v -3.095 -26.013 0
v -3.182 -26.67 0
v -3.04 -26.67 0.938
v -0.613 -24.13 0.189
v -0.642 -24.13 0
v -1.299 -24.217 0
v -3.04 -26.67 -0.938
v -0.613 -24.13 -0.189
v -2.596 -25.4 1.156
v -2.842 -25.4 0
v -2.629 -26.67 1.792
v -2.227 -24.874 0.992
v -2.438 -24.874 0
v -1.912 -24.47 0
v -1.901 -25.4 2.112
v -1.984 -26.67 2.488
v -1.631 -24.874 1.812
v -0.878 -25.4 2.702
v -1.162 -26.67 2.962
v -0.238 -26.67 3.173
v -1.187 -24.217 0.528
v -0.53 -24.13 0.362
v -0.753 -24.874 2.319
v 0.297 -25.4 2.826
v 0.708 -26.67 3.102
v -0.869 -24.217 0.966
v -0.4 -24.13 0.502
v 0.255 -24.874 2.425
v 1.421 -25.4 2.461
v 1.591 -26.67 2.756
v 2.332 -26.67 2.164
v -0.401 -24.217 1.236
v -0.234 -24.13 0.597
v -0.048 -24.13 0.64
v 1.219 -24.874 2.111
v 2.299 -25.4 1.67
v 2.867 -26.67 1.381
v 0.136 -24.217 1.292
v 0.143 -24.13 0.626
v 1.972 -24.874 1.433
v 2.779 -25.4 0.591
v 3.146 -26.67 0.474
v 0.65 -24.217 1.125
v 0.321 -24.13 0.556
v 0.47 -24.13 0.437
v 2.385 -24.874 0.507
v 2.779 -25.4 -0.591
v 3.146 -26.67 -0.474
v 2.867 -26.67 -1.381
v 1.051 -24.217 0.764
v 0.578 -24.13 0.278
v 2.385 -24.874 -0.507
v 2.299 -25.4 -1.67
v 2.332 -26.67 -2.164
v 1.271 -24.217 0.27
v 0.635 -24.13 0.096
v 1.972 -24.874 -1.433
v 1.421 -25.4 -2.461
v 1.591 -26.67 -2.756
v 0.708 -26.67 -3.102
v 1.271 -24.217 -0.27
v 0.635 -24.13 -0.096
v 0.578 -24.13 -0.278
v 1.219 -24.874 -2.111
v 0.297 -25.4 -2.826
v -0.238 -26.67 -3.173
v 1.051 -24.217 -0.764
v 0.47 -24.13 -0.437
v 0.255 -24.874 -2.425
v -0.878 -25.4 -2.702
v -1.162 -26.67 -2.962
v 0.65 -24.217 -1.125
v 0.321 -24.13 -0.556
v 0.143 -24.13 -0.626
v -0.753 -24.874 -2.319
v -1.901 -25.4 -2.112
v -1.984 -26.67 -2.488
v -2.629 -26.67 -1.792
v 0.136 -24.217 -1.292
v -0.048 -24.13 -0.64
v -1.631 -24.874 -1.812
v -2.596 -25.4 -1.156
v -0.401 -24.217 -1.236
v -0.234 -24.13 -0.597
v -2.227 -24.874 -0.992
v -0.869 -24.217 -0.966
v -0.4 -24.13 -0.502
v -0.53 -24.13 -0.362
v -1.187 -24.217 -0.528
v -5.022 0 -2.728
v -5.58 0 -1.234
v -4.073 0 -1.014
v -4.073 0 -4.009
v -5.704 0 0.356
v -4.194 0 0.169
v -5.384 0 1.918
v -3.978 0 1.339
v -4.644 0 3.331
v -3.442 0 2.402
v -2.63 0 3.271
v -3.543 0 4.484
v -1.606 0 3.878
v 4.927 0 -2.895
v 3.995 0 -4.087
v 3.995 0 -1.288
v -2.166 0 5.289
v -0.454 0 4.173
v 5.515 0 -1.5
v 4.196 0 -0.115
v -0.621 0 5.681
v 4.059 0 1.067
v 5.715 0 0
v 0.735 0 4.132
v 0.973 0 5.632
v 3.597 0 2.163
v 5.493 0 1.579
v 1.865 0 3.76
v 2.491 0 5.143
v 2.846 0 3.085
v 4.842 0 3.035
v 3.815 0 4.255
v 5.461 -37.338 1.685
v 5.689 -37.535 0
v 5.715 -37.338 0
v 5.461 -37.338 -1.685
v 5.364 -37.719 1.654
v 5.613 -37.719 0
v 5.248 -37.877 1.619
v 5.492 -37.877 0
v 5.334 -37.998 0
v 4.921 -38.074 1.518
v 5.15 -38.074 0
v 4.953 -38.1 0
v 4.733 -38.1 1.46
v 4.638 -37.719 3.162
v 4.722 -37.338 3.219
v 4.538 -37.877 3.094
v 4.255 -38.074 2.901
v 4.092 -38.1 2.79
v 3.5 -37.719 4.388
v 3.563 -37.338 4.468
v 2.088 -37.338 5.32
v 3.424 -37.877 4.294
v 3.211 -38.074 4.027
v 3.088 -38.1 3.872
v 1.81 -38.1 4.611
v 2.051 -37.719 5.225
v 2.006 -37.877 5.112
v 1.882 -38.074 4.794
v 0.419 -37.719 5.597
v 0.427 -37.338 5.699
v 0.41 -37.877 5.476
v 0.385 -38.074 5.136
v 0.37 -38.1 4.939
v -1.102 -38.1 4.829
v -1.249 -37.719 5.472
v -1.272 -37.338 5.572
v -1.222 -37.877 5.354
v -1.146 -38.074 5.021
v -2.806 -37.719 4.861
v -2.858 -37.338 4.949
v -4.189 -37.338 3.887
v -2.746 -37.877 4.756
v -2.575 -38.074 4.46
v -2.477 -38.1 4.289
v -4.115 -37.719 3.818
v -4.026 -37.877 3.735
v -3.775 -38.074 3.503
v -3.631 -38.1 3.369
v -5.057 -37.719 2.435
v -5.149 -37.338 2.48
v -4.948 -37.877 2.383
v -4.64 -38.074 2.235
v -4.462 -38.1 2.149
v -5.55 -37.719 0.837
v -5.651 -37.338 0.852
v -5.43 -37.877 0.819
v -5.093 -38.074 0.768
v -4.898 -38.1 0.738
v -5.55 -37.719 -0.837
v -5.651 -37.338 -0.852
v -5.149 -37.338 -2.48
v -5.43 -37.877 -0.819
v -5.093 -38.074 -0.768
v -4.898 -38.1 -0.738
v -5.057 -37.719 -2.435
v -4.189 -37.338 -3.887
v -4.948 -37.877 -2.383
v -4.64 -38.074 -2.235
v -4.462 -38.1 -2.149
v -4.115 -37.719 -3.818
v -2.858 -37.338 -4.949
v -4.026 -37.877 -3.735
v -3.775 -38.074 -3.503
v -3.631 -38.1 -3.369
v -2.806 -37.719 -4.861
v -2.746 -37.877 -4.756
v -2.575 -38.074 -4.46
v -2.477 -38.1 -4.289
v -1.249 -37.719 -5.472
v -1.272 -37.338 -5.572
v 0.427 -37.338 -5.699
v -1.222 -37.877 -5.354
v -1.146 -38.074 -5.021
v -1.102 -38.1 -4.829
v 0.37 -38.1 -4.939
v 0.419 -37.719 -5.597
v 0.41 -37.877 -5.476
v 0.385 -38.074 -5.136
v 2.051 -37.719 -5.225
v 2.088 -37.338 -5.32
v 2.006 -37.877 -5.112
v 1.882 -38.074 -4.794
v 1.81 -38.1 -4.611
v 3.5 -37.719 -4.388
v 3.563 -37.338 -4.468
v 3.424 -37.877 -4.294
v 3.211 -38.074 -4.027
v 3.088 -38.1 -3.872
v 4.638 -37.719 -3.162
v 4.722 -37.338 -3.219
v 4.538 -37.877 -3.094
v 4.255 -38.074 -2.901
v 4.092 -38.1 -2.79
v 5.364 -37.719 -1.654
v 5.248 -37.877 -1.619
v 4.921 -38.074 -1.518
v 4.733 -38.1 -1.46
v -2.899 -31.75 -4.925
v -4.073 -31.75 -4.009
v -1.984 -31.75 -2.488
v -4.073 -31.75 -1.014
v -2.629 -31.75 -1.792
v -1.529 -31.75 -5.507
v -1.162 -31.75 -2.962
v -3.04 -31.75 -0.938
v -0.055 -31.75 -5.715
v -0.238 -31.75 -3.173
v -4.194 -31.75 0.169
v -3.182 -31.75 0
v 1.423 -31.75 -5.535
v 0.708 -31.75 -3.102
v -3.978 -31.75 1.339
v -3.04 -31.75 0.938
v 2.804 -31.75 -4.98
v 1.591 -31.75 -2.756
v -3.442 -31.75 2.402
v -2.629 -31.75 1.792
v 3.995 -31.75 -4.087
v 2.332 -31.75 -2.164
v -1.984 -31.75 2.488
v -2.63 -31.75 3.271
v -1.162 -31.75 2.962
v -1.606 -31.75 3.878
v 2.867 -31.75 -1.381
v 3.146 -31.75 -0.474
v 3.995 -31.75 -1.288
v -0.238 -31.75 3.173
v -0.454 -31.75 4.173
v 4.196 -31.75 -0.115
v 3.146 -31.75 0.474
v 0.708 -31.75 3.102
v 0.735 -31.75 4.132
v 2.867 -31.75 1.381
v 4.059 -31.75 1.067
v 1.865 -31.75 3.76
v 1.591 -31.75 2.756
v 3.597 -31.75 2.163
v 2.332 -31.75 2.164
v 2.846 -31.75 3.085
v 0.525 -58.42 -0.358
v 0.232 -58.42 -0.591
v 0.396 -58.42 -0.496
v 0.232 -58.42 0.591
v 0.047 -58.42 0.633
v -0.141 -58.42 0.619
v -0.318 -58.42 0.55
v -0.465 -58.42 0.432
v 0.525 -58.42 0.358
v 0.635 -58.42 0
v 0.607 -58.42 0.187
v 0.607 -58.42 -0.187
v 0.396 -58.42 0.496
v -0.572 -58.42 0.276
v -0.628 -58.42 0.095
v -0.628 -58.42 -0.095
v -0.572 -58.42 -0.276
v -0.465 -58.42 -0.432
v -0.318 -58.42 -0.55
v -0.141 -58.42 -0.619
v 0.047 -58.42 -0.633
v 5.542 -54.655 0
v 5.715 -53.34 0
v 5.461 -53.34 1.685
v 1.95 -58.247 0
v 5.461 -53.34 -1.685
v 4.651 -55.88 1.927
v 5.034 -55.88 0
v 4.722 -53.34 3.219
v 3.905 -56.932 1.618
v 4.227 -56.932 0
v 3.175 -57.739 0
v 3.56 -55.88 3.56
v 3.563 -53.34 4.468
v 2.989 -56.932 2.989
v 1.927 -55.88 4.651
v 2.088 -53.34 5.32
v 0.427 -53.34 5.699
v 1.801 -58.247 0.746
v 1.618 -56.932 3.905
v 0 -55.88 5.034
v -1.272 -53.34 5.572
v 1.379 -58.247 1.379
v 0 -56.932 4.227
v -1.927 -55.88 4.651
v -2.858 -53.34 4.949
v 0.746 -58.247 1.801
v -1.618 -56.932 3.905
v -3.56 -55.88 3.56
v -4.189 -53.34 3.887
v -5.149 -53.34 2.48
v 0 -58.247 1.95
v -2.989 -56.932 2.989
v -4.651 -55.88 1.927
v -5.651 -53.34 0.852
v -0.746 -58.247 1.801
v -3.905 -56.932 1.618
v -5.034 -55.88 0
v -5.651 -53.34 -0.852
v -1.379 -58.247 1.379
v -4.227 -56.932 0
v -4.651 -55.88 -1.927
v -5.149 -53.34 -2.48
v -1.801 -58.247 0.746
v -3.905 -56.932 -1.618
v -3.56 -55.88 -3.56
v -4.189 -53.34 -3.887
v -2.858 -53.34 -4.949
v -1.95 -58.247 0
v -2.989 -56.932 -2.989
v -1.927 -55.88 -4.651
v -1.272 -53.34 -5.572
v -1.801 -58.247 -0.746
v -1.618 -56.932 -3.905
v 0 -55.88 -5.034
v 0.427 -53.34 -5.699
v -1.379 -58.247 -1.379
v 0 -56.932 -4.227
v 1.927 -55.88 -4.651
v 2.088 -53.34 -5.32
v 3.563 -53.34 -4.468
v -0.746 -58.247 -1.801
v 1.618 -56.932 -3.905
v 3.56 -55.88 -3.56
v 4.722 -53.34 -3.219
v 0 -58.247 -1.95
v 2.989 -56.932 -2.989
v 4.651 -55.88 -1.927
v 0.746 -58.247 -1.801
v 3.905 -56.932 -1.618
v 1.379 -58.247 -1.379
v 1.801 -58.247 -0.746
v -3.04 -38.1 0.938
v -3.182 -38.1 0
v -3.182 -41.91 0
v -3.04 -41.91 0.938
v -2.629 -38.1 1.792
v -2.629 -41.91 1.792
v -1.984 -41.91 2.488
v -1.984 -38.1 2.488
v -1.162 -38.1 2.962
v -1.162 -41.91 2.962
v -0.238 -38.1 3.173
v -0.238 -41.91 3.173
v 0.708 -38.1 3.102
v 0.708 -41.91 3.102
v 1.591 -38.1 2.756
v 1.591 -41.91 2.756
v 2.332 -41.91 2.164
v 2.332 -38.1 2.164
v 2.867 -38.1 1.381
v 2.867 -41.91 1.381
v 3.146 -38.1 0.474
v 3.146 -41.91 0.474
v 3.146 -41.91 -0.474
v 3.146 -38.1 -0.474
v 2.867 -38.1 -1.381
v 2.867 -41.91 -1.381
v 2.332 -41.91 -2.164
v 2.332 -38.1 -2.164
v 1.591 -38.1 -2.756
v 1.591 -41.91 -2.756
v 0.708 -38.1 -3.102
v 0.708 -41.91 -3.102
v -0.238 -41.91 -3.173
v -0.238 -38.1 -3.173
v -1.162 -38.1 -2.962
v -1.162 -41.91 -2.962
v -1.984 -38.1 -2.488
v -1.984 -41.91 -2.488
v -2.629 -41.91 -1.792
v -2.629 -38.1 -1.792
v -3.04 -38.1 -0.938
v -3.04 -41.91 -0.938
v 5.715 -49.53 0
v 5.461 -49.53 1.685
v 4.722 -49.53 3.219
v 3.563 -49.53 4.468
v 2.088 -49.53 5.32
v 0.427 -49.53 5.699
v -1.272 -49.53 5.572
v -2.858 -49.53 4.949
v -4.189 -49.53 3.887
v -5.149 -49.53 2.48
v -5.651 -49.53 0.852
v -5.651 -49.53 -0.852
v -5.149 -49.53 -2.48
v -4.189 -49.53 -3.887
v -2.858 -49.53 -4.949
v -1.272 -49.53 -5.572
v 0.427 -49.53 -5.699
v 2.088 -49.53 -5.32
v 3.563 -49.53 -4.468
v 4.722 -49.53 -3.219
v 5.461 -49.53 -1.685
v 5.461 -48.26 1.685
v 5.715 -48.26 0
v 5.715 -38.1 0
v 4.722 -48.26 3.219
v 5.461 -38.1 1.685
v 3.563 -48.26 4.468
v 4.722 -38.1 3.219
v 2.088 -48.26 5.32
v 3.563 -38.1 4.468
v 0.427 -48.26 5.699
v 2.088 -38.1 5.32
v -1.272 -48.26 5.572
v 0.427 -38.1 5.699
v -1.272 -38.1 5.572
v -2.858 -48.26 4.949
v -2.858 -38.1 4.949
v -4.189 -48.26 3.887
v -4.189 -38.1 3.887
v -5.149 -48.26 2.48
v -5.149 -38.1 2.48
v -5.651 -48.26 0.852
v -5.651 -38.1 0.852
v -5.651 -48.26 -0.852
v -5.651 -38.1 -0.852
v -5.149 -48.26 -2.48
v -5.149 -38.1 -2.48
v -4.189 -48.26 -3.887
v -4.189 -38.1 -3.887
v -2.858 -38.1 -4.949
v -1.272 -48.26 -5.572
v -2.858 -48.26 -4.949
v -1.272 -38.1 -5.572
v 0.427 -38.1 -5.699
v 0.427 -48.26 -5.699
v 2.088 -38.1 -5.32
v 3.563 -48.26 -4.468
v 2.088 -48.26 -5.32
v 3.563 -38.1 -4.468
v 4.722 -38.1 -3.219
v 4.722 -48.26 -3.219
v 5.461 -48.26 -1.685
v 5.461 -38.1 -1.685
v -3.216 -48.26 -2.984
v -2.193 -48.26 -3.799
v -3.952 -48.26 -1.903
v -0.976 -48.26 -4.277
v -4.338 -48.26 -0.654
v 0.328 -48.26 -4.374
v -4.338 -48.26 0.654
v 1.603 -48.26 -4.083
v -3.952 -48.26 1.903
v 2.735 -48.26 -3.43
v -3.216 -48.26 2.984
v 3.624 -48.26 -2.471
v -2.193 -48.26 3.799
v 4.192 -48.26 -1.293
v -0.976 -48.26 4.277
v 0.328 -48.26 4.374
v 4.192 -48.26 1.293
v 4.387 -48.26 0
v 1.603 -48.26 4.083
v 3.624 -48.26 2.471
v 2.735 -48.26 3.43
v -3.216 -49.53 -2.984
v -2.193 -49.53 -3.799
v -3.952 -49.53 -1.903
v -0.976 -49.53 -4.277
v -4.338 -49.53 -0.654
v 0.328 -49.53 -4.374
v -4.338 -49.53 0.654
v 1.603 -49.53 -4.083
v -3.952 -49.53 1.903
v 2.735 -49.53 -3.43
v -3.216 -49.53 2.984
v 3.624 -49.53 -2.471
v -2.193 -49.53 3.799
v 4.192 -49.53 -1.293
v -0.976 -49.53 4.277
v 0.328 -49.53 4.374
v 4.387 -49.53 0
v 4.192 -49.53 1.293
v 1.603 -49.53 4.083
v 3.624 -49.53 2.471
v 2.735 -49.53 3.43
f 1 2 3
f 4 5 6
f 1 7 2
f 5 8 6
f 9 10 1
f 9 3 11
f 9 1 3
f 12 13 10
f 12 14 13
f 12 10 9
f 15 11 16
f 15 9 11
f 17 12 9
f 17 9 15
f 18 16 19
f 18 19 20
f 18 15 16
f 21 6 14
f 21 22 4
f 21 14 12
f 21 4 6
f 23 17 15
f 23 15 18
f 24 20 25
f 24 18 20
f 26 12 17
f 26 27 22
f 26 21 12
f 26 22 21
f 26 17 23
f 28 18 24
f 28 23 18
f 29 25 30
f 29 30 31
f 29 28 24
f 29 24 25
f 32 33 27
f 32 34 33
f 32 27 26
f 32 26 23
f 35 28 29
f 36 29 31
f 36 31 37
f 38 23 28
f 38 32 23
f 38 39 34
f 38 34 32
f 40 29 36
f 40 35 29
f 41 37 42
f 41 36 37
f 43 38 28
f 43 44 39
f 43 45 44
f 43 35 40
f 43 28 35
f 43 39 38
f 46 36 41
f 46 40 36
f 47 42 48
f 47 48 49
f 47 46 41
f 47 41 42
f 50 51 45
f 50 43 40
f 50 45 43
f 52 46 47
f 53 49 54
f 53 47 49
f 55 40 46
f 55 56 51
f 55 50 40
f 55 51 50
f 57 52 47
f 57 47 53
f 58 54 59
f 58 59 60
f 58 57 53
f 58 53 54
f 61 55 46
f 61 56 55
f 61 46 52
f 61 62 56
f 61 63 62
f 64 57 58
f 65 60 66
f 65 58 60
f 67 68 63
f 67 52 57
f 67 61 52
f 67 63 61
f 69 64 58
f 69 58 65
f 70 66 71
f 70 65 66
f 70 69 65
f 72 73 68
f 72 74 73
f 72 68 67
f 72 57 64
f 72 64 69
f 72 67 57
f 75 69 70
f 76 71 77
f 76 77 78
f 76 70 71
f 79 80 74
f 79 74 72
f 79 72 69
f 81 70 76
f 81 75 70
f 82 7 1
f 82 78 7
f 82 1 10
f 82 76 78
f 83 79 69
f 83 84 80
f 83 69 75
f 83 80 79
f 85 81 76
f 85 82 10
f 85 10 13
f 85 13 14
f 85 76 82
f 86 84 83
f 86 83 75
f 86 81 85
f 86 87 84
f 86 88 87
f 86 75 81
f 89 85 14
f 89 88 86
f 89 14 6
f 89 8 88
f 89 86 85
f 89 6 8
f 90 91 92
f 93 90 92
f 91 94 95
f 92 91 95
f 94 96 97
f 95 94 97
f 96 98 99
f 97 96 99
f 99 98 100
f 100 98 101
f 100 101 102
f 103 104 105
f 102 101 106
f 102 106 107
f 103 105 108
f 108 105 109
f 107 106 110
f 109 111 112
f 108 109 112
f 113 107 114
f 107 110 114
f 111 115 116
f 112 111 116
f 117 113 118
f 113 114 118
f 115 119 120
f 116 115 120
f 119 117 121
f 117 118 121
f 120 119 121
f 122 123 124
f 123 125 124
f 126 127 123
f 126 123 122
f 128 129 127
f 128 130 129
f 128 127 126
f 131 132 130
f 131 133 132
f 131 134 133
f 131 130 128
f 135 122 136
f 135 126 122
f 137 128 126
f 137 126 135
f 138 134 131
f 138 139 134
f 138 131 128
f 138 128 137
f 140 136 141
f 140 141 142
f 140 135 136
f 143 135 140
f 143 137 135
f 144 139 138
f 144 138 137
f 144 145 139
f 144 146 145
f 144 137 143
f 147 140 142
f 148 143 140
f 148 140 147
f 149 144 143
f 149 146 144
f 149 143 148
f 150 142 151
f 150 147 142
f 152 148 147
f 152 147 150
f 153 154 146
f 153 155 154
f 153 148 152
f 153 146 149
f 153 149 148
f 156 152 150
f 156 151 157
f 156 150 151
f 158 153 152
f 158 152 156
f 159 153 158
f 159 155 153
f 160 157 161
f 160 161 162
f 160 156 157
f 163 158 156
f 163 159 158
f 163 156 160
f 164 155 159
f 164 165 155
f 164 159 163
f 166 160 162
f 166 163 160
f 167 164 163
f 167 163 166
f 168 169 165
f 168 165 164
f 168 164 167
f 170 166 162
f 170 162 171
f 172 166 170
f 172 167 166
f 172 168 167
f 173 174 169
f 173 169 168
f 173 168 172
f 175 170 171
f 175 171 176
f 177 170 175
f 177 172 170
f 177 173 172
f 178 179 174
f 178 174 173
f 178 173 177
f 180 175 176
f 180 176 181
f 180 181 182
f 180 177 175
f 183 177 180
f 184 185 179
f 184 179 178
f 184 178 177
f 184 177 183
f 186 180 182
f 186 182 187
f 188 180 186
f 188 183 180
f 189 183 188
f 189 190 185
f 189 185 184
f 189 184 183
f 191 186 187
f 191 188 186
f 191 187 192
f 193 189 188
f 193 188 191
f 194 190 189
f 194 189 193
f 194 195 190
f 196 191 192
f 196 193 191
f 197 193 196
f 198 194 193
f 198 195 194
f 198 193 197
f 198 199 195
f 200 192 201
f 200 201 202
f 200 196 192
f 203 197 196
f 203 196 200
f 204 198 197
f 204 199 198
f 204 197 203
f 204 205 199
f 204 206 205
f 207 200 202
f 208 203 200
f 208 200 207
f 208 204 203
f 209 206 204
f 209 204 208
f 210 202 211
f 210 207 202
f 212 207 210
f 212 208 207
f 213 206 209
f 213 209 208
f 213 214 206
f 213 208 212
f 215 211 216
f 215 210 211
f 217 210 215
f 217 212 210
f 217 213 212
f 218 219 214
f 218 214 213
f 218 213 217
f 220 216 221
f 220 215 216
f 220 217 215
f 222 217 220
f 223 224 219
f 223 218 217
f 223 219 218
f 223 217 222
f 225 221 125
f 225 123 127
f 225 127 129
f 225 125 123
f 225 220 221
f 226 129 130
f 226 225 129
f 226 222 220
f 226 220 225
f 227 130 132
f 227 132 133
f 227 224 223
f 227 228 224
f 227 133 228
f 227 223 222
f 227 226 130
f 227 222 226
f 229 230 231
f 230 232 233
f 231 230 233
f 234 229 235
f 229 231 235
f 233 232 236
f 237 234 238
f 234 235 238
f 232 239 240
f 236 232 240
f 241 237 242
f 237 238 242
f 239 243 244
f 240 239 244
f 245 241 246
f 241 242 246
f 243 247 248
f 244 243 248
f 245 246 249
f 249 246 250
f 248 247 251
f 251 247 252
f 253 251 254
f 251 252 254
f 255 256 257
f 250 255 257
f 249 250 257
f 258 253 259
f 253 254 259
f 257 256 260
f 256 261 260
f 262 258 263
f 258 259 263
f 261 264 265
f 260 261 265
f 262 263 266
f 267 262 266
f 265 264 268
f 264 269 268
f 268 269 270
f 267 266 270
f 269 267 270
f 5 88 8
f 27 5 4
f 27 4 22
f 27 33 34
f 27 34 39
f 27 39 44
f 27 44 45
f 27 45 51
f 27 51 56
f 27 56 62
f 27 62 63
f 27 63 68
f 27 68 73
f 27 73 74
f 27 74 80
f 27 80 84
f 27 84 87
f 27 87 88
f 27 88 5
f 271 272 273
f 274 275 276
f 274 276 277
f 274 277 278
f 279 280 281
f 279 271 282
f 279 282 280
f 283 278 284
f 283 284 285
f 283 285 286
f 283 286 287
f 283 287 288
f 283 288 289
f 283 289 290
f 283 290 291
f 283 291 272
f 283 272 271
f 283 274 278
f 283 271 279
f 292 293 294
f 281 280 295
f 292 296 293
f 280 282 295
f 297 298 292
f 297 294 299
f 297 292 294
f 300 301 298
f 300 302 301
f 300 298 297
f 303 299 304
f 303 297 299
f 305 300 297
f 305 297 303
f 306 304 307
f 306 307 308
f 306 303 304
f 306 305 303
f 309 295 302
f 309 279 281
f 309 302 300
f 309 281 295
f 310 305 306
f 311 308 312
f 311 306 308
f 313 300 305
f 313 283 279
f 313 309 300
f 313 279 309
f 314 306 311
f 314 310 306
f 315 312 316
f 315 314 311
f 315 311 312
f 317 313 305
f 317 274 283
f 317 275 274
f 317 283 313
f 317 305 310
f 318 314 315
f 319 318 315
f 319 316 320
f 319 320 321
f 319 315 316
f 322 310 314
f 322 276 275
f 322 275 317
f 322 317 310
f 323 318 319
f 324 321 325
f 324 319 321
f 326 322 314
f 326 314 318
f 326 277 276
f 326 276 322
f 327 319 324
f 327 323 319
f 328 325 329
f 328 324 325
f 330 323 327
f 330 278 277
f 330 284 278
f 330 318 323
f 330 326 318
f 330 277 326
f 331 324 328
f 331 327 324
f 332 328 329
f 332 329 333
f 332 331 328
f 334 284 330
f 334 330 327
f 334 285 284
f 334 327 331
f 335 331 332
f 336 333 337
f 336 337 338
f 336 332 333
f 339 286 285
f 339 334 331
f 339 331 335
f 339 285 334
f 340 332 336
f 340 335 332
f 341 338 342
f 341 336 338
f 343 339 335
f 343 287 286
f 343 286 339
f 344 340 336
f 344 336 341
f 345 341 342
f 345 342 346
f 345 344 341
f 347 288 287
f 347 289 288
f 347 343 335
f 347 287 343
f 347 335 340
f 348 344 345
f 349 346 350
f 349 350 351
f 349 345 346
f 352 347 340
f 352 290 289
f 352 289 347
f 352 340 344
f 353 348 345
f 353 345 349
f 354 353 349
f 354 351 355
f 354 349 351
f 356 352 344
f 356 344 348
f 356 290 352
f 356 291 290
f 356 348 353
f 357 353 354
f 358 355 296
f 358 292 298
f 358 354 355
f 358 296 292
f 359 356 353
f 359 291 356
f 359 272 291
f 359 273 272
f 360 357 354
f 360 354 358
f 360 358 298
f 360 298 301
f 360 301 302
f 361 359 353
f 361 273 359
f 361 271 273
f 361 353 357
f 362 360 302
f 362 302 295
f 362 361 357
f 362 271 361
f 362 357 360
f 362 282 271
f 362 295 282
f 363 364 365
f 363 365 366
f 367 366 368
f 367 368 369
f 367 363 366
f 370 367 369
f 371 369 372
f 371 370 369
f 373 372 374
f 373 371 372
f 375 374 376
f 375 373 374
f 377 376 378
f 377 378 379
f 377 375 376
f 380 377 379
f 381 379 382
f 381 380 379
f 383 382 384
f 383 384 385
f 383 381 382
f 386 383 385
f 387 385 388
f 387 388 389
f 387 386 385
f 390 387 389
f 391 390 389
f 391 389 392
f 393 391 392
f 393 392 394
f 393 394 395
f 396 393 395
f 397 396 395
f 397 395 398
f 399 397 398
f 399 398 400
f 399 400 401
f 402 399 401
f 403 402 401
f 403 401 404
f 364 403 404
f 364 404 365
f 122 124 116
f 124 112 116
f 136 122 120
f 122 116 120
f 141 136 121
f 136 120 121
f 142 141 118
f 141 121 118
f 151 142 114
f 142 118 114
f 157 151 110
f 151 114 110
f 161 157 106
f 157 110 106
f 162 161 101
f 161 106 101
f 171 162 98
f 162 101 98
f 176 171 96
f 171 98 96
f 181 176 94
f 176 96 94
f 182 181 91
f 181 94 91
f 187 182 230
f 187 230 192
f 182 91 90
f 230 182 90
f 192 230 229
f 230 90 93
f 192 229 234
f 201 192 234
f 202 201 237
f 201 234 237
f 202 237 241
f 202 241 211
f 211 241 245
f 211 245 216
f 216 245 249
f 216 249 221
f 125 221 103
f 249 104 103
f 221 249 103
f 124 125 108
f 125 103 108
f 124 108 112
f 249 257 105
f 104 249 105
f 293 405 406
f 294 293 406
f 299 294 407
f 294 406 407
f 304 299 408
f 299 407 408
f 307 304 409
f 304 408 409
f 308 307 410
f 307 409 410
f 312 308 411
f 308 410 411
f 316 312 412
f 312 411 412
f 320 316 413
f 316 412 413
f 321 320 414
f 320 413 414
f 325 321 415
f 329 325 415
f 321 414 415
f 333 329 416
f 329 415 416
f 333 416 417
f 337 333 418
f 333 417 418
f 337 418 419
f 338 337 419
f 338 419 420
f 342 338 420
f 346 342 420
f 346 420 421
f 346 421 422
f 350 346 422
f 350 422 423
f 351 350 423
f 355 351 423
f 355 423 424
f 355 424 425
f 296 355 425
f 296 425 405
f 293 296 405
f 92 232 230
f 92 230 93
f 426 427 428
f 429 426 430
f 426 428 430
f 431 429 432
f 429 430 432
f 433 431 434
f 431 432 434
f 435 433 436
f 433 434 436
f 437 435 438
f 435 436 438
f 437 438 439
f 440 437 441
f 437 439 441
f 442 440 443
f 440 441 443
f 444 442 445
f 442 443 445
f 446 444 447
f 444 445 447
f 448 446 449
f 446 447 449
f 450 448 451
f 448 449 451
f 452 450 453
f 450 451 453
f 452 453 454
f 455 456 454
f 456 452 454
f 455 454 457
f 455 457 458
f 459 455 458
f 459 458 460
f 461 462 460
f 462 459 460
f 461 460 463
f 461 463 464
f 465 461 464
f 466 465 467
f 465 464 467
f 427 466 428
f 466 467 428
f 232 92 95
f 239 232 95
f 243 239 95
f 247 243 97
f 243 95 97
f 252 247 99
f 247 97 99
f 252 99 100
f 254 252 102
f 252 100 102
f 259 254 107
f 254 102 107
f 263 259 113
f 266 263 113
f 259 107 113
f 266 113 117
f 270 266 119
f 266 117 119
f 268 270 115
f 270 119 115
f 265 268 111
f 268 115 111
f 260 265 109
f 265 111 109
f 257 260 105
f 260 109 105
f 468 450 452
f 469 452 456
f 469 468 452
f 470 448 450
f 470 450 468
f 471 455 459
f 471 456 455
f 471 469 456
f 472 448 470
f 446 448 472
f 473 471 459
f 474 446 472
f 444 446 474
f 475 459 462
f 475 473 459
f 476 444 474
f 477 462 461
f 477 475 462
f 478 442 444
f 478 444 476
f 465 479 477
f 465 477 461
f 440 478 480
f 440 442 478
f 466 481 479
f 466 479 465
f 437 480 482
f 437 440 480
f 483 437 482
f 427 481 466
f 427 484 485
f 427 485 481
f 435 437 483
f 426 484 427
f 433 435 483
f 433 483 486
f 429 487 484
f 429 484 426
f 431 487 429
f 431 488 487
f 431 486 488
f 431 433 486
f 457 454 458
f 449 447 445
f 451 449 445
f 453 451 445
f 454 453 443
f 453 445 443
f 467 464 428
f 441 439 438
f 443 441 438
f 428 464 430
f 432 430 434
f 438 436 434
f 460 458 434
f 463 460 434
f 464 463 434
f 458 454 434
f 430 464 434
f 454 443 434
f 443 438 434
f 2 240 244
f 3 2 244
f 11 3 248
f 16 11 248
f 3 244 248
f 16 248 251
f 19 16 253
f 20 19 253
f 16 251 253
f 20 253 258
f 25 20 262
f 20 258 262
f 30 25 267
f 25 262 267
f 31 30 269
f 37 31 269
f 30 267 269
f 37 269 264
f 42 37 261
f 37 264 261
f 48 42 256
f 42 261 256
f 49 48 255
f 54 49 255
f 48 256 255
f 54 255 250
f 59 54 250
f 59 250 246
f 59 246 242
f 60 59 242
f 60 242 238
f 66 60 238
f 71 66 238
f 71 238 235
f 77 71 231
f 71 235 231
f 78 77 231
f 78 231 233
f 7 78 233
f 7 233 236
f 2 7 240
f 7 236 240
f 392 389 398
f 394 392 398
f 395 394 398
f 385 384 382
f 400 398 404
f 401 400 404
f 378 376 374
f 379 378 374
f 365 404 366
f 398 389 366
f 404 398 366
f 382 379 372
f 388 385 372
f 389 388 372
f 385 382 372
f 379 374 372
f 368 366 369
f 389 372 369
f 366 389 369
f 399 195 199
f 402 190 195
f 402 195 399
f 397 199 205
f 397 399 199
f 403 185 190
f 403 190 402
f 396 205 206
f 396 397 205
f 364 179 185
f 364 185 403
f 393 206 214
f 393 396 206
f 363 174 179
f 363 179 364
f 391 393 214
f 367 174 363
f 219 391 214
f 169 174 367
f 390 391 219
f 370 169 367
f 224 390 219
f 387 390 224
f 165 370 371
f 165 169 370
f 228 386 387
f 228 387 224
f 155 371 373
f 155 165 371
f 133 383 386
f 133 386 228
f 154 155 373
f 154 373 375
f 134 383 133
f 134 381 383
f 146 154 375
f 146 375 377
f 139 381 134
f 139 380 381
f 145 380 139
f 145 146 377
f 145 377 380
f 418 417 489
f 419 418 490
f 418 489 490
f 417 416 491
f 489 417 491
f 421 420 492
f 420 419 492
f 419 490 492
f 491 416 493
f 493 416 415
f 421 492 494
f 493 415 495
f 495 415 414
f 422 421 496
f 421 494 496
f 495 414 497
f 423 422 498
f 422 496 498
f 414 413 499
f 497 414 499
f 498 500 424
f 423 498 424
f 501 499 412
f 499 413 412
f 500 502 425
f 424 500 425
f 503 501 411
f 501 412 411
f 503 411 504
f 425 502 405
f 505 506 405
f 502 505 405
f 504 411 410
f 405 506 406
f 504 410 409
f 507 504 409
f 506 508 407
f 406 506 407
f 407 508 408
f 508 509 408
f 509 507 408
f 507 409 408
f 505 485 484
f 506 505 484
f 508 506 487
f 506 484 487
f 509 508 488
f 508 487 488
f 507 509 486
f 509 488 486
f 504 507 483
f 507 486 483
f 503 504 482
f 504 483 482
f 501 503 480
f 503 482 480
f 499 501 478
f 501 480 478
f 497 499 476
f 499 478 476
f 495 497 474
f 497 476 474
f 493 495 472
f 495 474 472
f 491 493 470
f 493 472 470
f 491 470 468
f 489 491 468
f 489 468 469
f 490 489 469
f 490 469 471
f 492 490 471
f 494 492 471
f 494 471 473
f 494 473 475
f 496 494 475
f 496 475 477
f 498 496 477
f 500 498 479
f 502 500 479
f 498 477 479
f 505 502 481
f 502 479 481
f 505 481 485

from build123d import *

# Parameters (mm, degrees)
F0_R           = 5.715
F1_DEPTH       = 38.1
F2_R           = 5.715
F3_DEPTH       = 20.32
F4_R           = 0.762
F5_R           = 4.1972298984
F6_DEPTH       = 31.75
F7_W           = 8.0674731684
F7_H           = 31.75
F8_DEPTH       = 25.4
F9_R           = 3.1818163762
F10_DEPTH      = 7.62
F10_DEPTH_BACK = 10.16
F11_R          = 2.54
F12_R          = 5.08
F14_R          = 10.1897381857
F14_R_2        = 4.3866323881
F15_DEPTH      = 1.27


with BuildPart() as f1:
    # F0 (on Front) → F1 (new body)
    with BuildSketch(Plane.XZ):
        Circle(F0_R)
    extrude(amount=F1_DEPTH)

    # F4
    f4_edges = [f1.edges().sort_by_distance(p)[0] for p in [
        (-5.715, -38.1, 0),
    ]]
    fillet(f4_edges, radius=F4_R)

    # F5 (on face) → F6 (cut)
    with BuildSketch(Plane(origin=(0, 0, 0), x_dir=(-1, 0, 0), z_dir=(0, 1, 0))):
        Circle(F5_R)
    extrude(amount=-F6_DEPTH, mode=Mode.SUBTRACT)

    # F7 (on Top) → F8 (cut)
    with BuildSketch(Plane.XY):
        with Locations((-0.0390663249, -15.875)):
            Rectangle(F7_W, F7_H)
    extrude(amount=-F8_DEPTH, mode=Mode.SUBTRACT)

    # F9 (on face) → F10 (join, two sides)
    with BuildSketch(Plane(origin=(0, -31.75, 0), x_dir=(-1, 0, 0), z_dir=(0, 1, 0))) as f10_sk:
        Circle(F9_R)
    extrude(amount=F10_DEPTH)
    extrude(f10_sk.sketch, amount=-F10_DEPTH_BACK)

    # F11
    f11_edges = [f1.edges().sort_by_distance(p)[0] for p in [
        (3.181816, -24.13, 0),
    ]]
    fillet(f11_edges, radius=F11_R)


with BuildPart() as f3:
    # F2 (on face) → F3 (new body)
    with BuildSketch(Plane.XZ.offset(38.1)):
        Circle(F2_R)
    extrude(amount=F3_DEPTH)

    # F12
    f12_edges = [f3.edges().sort_by_distance(p)[0] for p in [
        (-5.715, -58.42, 0),
    ]]
    fillet(f12_edges, radius=F12_R)

    # F14 (on offset) → F15 (cut)
    with BuildSketch(Plane.XZ.offset(48.26)):
        Circle(F14_R)
        Circle(F14_R_2, mode=Mode.SUBTRACT)
    extrude(amount=F15_DEPTH, mode=Mode.SUBTRACT)


solid = Compound([f1.part, f3.part])
